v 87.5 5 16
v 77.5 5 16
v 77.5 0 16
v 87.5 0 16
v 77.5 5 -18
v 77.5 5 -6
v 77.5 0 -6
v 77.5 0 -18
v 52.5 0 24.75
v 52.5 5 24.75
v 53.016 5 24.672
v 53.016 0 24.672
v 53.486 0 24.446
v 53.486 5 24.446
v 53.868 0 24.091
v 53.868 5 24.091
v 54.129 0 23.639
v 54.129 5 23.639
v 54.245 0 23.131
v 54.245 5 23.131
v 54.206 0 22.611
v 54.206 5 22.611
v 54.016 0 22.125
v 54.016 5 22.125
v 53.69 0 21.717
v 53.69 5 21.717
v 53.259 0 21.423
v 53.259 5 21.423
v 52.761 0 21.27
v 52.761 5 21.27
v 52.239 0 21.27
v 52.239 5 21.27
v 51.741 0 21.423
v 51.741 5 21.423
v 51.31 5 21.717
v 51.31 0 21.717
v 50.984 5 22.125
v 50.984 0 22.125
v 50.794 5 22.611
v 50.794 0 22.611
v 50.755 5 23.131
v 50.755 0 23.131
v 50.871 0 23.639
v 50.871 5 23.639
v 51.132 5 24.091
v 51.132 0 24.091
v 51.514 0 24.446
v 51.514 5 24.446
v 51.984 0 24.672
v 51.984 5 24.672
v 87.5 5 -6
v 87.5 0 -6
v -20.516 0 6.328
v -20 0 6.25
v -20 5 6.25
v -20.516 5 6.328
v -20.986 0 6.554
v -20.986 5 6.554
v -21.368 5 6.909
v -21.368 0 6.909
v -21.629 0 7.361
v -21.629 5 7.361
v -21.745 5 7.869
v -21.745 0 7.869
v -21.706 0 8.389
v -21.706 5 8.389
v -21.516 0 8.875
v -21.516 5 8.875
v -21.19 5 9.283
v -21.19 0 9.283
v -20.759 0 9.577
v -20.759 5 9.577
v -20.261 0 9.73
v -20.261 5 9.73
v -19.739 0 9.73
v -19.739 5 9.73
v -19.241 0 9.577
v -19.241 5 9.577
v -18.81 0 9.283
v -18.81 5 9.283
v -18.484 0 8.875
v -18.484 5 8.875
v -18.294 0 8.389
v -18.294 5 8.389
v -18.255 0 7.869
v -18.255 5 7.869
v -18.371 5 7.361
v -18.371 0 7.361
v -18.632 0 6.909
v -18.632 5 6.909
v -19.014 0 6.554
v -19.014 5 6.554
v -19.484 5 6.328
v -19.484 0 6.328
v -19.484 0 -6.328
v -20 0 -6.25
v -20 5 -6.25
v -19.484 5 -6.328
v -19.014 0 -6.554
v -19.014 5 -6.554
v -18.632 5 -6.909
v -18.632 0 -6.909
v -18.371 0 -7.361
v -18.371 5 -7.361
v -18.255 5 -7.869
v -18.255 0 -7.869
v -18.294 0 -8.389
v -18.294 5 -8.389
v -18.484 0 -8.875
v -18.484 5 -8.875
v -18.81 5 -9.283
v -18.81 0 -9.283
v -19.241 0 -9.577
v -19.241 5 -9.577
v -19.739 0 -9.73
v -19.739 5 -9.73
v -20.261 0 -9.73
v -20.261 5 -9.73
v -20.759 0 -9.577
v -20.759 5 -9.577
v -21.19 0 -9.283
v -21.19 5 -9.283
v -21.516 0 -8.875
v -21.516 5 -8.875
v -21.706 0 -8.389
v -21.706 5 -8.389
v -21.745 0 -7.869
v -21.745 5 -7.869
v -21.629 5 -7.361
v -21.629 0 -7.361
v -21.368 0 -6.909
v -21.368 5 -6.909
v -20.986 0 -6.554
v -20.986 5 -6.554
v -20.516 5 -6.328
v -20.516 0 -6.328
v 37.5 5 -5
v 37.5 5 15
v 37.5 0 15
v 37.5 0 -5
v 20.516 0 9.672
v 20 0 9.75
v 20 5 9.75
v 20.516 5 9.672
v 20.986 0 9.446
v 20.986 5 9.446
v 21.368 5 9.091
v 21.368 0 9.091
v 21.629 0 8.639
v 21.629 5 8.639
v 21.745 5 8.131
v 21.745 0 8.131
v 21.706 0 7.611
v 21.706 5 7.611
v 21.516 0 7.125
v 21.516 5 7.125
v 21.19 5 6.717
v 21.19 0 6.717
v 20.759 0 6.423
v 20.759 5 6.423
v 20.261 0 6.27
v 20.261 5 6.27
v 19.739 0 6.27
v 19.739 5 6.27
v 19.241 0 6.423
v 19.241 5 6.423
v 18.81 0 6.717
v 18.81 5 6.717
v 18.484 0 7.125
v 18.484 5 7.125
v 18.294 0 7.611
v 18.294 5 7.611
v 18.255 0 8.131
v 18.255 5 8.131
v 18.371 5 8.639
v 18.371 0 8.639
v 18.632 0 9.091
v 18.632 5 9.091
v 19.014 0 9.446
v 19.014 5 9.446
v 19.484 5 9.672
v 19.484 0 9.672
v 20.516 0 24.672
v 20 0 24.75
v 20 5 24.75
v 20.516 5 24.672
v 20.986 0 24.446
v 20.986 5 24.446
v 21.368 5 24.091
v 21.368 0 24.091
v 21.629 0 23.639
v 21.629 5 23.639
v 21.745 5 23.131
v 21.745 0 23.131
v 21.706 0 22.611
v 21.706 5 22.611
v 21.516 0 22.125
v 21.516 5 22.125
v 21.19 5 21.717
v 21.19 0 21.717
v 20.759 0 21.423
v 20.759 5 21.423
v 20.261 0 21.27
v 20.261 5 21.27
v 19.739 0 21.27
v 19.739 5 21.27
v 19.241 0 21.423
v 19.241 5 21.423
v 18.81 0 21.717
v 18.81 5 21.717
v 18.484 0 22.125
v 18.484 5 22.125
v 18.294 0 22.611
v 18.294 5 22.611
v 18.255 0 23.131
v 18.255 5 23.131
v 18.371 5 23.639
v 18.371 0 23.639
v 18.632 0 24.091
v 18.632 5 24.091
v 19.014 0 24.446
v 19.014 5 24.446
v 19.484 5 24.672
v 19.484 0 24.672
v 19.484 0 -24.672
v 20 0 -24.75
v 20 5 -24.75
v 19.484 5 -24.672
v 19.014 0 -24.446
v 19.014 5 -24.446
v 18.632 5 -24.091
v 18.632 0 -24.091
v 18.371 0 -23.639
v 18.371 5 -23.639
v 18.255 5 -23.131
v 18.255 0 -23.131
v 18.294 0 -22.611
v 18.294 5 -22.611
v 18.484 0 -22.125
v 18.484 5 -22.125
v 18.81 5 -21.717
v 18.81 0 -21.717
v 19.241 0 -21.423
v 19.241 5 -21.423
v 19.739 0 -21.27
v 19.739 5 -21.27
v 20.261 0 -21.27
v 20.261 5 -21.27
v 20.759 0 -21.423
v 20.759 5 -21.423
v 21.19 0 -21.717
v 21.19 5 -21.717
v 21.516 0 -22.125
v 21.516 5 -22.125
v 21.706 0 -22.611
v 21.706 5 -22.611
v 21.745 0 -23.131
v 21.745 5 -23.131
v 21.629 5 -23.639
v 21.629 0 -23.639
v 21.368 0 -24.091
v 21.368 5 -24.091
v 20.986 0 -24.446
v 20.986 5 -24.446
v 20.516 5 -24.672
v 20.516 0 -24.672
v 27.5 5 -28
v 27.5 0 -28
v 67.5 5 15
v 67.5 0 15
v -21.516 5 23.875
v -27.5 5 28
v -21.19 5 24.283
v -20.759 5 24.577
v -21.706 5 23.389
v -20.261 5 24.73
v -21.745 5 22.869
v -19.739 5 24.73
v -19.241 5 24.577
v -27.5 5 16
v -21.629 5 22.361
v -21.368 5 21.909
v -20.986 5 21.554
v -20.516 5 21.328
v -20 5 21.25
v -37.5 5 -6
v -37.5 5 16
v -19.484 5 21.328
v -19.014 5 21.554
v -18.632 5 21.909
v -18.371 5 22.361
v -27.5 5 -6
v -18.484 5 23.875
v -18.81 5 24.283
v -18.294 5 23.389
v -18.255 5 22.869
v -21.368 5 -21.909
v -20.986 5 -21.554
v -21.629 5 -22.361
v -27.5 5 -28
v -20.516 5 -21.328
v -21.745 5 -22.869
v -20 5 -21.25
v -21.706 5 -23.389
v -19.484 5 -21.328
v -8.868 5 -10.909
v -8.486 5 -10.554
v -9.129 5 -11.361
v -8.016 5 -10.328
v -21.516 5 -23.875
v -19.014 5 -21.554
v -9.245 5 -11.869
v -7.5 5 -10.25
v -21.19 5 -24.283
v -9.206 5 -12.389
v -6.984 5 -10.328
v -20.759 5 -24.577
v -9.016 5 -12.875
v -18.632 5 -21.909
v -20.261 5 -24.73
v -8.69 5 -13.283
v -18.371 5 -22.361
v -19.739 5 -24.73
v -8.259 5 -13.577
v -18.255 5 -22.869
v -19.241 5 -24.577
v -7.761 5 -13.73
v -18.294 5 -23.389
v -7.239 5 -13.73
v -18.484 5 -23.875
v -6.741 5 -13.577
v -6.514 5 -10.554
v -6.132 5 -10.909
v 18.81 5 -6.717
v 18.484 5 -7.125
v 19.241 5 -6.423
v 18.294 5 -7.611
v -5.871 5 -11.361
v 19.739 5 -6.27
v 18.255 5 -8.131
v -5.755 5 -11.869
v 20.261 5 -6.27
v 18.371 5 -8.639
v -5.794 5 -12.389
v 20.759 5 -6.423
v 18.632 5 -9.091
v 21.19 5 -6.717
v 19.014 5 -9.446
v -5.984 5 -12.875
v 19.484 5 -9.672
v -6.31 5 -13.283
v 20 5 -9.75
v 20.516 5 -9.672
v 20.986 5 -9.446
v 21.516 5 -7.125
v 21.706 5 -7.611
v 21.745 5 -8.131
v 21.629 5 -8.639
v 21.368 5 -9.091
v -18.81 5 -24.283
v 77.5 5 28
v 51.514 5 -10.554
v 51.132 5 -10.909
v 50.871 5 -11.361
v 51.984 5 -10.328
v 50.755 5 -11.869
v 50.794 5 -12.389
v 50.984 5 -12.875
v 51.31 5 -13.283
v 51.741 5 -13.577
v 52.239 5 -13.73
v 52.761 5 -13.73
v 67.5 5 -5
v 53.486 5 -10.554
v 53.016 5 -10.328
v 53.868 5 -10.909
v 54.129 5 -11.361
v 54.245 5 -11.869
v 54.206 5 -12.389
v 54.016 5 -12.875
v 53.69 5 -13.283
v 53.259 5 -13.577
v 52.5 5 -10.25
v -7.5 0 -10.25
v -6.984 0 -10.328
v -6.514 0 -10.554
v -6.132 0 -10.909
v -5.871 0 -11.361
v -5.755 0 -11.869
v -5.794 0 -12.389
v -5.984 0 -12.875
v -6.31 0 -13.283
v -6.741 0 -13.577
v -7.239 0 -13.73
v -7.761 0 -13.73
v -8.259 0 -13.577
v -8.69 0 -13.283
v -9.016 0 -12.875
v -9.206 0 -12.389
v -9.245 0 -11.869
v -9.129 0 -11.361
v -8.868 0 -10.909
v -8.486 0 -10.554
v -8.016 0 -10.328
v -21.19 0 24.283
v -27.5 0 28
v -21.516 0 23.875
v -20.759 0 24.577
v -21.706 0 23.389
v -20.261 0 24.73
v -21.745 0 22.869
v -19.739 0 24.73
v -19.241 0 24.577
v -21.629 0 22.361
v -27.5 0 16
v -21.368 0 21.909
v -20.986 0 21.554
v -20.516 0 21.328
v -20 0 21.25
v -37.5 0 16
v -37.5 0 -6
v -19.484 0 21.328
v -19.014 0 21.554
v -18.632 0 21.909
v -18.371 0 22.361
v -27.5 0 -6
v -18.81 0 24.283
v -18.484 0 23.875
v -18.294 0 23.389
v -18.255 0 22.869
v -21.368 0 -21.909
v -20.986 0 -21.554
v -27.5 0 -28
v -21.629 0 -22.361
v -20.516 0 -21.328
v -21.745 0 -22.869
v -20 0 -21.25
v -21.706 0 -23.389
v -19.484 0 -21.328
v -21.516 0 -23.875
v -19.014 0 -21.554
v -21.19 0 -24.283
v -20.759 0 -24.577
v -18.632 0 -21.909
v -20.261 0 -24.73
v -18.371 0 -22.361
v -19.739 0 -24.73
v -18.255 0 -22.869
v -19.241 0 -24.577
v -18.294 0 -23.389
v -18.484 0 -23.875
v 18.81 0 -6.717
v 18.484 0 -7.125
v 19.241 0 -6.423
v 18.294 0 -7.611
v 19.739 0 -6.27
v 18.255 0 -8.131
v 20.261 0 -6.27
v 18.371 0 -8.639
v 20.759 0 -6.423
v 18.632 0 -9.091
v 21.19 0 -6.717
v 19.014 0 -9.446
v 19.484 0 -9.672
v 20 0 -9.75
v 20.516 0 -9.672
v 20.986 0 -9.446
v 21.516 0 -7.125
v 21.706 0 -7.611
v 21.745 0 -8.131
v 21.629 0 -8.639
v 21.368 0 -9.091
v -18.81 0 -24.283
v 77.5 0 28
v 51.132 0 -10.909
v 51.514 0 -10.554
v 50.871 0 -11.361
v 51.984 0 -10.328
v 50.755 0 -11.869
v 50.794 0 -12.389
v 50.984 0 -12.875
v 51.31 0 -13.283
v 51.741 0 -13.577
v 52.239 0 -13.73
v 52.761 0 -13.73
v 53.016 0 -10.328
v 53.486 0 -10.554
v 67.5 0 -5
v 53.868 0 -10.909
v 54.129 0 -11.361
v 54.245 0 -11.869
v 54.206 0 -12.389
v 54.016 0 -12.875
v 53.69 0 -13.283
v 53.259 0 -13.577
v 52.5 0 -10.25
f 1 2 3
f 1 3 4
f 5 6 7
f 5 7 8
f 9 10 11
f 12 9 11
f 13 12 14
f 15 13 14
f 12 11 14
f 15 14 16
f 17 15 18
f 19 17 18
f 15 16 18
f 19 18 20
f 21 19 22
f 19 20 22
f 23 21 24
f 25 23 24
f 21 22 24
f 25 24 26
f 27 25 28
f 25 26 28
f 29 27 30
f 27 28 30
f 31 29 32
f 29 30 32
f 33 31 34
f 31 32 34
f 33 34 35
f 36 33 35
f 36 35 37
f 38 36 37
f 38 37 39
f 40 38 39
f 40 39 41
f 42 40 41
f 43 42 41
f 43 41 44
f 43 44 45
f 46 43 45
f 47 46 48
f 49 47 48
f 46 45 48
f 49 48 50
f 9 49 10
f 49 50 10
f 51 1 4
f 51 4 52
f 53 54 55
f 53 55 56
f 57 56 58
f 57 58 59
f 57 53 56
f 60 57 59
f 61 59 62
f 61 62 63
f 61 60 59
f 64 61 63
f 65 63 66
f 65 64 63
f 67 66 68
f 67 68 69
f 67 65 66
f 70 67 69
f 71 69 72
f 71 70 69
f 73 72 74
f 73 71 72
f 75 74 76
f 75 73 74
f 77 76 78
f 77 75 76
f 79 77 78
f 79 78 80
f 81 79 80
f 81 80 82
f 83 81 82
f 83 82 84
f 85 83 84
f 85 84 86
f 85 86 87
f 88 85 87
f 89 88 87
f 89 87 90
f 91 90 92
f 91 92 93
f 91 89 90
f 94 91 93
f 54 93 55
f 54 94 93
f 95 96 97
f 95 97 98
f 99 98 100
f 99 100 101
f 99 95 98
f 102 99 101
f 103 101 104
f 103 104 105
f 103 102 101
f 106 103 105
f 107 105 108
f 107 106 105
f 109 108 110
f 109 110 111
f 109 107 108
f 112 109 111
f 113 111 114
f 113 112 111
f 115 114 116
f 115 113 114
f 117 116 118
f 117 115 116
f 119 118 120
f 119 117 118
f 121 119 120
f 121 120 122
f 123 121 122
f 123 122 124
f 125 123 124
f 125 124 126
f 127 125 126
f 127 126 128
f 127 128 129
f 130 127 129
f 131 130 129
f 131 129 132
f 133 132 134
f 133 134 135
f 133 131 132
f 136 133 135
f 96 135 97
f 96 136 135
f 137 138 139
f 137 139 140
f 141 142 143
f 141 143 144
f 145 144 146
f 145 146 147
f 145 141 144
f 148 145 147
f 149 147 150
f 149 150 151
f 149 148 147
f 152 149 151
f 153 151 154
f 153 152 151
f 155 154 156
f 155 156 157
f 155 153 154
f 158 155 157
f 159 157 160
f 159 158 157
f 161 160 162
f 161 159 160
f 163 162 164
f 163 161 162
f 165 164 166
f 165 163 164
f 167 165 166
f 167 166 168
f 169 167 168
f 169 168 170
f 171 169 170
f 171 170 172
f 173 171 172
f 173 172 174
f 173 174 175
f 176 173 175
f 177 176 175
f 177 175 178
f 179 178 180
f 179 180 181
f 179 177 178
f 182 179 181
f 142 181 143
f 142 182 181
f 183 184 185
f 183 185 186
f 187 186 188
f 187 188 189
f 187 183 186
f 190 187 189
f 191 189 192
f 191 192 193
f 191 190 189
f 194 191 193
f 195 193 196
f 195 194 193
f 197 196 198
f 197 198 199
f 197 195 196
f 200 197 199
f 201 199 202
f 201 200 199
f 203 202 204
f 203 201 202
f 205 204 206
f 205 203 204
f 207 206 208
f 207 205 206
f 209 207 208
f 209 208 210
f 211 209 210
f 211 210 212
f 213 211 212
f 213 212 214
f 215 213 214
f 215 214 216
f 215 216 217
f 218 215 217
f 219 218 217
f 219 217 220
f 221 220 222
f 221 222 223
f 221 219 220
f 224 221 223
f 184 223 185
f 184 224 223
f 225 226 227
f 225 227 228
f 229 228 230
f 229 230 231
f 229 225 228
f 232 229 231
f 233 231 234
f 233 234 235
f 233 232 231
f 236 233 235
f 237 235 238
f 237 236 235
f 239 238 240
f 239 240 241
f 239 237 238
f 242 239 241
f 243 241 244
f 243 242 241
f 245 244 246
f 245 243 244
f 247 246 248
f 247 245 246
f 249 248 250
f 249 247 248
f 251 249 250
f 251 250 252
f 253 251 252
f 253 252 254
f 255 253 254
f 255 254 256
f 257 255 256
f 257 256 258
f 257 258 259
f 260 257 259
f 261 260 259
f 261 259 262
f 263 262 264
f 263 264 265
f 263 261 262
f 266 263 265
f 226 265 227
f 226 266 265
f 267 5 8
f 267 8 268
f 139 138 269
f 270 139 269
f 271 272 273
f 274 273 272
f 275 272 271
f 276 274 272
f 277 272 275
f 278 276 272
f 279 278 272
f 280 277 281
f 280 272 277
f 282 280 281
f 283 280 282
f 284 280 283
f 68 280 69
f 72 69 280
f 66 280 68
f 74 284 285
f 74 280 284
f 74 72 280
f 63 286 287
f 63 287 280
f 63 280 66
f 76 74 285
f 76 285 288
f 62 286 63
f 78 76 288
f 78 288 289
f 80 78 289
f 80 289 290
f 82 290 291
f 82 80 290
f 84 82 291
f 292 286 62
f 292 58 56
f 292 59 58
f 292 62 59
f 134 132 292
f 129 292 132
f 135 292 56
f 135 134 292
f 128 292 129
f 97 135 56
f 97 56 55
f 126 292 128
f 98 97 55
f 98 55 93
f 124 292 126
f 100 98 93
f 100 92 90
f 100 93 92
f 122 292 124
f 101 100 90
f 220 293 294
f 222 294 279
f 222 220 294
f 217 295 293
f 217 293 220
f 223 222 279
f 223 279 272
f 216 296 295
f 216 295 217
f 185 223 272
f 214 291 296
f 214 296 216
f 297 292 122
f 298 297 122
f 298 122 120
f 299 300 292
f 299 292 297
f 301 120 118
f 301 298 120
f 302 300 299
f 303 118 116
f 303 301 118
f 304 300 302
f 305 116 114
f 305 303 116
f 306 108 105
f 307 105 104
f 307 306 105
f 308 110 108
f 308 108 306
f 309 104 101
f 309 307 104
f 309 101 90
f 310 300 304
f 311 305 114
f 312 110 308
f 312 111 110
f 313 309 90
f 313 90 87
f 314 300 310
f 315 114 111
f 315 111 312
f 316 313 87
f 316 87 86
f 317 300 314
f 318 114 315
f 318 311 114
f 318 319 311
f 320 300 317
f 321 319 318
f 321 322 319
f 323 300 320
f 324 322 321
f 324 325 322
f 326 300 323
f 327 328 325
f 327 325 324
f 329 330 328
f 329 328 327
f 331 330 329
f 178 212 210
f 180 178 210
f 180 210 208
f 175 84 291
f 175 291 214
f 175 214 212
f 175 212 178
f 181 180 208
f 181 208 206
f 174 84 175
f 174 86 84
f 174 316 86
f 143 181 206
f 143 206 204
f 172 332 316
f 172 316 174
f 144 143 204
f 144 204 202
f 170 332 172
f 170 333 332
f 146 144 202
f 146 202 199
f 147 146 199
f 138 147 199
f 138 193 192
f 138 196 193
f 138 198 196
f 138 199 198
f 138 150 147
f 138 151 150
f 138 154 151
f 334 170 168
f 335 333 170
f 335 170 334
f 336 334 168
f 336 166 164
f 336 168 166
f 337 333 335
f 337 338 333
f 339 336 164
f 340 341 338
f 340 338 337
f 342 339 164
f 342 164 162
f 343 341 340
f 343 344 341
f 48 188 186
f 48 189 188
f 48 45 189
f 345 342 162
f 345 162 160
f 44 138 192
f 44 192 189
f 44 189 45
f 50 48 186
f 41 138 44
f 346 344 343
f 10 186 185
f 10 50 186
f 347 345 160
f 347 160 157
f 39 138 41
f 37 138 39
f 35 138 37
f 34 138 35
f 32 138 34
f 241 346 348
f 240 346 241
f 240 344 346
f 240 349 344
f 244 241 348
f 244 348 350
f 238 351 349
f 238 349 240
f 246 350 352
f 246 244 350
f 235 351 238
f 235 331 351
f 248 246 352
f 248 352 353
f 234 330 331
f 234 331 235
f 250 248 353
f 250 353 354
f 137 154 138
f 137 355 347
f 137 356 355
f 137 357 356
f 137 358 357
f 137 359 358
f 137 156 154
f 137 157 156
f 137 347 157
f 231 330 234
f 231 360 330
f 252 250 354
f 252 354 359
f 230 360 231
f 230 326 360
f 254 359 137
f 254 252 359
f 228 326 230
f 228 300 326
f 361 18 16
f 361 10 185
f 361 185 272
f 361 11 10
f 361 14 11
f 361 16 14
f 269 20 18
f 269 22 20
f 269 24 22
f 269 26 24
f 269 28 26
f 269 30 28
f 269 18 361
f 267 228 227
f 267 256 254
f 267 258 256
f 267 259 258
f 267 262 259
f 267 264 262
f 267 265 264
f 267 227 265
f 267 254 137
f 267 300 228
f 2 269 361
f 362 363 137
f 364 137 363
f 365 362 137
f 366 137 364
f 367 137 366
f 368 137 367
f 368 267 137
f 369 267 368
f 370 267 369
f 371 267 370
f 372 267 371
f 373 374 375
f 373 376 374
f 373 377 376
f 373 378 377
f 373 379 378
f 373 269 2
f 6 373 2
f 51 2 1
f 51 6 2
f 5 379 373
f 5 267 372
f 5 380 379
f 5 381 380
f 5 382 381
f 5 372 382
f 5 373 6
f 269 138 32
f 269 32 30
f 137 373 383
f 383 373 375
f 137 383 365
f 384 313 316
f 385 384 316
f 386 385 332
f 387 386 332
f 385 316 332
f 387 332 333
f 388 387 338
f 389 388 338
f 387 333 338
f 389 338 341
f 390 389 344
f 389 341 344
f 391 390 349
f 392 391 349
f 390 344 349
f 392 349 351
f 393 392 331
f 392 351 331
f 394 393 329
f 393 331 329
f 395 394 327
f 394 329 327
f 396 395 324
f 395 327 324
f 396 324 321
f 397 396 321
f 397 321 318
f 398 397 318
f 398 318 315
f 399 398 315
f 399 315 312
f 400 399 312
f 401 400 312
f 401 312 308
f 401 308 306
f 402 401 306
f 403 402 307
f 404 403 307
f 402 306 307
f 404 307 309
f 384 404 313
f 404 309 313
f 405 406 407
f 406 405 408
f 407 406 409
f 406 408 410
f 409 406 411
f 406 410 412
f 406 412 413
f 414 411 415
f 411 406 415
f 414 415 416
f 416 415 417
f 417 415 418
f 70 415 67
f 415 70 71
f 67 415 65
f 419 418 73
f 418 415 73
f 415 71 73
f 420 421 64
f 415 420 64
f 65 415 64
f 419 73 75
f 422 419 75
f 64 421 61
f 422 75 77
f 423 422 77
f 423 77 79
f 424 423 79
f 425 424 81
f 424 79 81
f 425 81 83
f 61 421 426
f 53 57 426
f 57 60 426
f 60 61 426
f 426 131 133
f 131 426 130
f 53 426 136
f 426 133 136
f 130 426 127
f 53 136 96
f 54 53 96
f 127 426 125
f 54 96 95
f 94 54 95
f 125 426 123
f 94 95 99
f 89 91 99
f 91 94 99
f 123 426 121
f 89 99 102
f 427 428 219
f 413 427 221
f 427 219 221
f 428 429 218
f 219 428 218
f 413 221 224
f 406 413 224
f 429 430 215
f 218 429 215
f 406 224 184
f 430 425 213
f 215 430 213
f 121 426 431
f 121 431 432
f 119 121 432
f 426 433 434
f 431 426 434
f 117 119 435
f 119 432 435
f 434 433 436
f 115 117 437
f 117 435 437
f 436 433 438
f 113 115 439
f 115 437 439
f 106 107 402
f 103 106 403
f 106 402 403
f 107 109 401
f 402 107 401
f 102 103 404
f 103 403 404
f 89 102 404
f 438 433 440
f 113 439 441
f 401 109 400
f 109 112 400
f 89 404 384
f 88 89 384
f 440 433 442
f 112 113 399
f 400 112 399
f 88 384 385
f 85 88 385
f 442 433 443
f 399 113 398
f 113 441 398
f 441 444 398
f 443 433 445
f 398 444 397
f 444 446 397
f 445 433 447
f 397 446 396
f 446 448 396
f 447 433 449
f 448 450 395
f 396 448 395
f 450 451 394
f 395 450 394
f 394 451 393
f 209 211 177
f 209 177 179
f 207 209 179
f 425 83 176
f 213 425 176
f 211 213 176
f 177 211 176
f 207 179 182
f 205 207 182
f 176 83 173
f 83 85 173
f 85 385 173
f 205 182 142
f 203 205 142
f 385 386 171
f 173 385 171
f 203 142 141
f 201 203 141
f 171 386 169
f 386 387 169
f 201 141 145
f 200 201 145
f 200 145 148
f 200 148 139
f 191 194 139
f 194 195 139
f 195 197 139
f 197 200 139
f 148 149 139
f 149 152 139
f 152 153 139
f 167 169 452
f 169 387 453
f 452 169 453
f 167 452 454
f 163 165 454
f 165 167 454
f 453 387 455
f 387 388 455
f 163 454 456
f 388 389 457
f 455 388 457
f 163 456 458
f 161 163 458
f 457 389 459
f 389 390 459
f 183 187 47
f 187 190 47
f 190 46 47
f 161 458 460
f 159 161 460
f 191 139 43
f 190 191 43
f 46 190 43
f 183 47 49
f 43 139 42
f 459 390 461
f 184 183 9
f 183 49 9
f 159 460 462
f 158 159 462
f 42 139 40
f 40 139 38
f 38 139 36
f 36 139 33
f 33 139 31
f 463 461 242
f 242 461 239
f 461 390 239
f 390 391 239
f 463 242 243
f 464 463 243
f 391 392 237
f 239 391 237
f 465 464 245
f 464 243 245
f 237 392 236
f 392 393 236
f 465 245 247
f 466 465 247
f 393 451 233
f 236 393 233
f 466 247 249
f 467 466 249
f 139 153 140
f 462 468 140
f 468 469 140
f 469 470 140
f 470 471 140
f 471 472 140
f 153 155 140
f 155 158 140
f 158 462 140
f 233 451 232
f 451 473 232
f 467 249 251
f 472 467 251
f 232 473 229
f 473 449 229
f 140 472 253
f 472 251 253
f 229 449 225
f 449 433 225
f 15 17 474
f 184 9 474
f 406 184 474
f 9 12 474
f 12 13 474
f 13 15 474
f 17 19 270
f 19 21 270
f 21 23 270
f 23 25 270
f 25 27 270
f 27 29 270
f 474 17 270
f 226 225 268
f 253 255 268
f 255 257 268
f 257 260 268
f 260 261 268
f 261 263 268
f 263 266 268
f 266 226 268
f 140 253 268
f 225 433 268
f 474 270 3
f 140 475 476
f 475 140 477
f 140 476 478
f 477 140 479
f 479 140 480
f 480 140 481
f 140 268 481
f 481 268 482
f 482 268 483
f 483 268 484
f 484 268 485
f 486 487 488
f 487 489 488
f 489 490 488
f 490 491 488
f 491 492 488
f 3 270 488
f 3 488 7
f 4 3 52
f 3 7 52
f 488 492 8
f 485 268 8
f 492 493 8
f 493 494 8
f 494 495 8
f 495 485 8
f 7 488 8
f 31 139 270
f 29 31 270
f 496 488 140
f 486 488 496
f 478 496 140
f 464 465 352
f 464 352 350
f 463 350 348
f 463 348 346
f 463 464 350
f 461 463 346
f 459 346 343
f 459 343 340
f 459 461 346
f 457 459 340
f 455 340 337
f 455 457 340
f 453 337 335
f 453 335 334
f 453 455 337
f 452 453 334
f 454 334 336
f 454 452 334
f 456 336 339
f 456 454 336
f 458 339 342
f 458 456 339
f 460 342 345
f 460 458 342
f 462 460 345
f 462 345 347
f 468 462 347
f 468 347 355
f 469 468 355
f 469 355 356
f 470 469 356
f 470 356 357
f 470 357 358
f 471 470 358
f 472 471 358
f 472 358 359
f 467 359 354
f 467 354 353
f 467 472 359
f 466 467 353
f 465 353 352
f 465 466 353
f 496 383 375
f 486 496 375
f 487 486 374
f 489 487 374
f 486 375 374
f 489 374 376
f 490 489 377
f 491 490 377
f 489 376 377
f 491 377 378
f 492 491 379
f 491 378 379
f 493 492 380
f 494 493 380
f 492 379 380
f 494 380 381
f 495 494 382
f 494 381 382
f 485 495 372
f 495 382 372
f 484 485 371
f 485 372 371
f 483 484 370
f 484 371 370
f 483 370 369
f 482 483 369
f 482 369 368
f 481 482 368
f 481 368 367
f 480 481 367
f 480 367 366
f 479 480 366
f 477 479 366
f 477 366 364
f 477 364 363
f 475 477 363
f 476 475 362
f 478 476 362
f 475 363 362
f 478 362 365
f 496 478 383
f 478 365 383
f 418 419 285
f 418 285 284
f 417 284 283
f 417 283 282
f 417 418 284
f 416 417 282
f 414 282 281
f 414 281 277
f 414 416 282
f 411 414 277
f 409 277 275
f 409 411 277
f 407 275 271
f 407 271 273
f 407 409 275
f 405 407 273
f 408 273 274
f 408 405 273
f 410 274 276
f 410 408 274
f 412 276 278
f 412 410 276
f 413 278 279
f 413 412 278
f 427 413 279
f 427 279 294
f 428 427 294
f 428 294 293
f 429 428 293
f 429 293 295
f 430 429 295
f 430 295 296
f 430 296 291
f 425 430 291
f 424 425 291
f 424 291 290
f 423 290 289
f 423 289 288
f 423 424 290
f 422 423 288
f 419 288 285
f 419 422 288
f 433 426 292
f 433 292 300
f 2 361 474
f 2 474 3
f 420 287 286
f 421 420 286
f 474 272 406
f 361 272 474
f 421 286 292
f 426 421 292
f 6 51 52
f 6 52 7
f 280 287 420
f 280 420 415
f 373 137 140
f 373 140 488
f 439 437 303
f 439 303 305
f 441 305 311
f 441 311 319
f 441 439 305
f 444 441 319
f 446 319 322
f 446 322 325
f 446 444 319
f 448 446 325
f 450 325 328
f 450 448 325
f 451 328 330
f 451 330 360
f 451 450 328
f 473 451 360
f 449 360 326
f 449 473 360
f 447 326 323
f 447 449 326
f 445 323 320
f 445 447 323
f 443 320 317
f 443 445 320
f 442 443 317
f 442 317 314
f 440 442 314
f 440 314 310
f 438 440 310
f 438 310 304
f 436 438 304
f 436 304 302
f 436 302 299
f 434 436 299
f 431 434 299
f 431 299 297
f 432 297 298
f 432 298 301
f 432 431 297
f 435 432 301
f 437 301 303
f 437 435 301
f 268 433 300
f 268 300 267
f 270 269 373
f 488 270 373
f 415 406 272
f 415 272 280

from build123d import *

# Parameters (mm, degrees)
SKETCH2_W           = 55
SKETCH2_H           = 56
SKETCH2_R           = 1.75
BOSS_EXTRUDE1_DEPTH = 5
SKETCH3_W           = 30
SKETCH3_H           = 20
BOSS_EXTRUDE2_DEPTH = 5
SKETCH5_W           = 10
SKETCH5_H           = 22
BOSS_EXTRUDE3_DEPTH = 5
SKETCH6_R           = 1.75
CUT_EXTRUDE1_DEPTH  = 5


with BuildPart() as part:
    # Sketch2 → Boss-Extrude1 (new body)
    with BuildSketch(Plane(origin=(0, 0, 0), x_dir=(1, 0, 0), z_dir=(0, 1, 0))):
        Rectangle(SKETCH2_W, SKETCH2_H)
        with Locations(Location((-20, 8, 0), (0, 0, 270))):
            Circle(SKETCH2_R, mode=Mode.SUBTRACT)
        with Locations(Location((-20, 23, 0), (0, 0, 270))):
            Circle(SKETCH2_R, mode=Mode.SUBTRACT)
        with Locations(Location((20, 8, 0), (0, 0, 90))):
            Circle(SKETCH2_R, mode=Mode.SUBTRACT)
        with Locations(Location((20, 23, 0), (0, 0, 90))):
            Circle(SKETCH2_R, mode=Mode.SUBTRACT)
        with Locations(Location((20, -8, 0), (0, 0, 270))):
            Circle(SKETCH2_R, mode=Mode.SUBTRACT)
        with Locations(Location((20, -23, 0), (0, 0, 270))):
            Circle(SKETCH2_R, mode=Mode.SUBTRACT)
        with Locations(Location((-20, -8, 0), (0, 0, 90))):
            Circle(SKETCH2_R, mode=Mode.SUBTRACT)
        with Locations(Location((-20, -23, 0), (0, 0, 90))):
            Circle(SKETCH2_R, mode=Mode.SUBTRACT)
    extrude(amount=BOSS_EXTRUDE1_DEPTH)

    # Sketch3 → Boss-Extrude2 (add)
    with BuildSketch(Plane(origin=(0, 5, 0), x_dir=(1, 0, 0), z_dir=(0, 1, 0))):
        Polygon((27.5, 28), (27.5, -28), (77.5, -28), (77.5, -16), (87.5, -16), (87.5, 6), (77.5, 6), (77.5, 18), align=None)
        with Locations((52.5, -5)):
            Rectangle(SKETCH3_W, SKETCH3_H, mode=Mode.SUBTRACT)
    extrude(amount=-BOSS_EXTRUDE2_DEPTH)

    # Sketch5 → Boss-Extrude3 (add)
    with BuildSketch(Plane(origin=(0, 5, 0), x_dir=(1, 0, 0), z_dir=(0, 1, 0))):
        with Locations((-32.5, -5)):
            Rectangle(SKETCH5_W, SKETCH5_H)
    extrude(amount=-BOSS_EXTRUDE3_DEPTH)

    # Sketch6 → Cut-Extrude1 (cut)
    with BuildSketch(Plane(origin=(0, 5, 0), x_dir=(1, 0, 0), z_dir=(0, 1, 0))):
        with Locations(Location((-7.5, 12, 0), (0, 0, 270))):
            Circle(SKETCH6_R)
        with Locations(Location((52.5, 12, 0), (0, 0, 270))):
            Circle(SKETCH6_R)
        with Locations(Location((52.5, -23, 0), (0, 0, 270))):
            Circle(SKETCH6_R)
    extrude(amount=-CUT_EXTRUDE1_DEPTH, mode=Mode.SUBTRACT)


solid = part.part
